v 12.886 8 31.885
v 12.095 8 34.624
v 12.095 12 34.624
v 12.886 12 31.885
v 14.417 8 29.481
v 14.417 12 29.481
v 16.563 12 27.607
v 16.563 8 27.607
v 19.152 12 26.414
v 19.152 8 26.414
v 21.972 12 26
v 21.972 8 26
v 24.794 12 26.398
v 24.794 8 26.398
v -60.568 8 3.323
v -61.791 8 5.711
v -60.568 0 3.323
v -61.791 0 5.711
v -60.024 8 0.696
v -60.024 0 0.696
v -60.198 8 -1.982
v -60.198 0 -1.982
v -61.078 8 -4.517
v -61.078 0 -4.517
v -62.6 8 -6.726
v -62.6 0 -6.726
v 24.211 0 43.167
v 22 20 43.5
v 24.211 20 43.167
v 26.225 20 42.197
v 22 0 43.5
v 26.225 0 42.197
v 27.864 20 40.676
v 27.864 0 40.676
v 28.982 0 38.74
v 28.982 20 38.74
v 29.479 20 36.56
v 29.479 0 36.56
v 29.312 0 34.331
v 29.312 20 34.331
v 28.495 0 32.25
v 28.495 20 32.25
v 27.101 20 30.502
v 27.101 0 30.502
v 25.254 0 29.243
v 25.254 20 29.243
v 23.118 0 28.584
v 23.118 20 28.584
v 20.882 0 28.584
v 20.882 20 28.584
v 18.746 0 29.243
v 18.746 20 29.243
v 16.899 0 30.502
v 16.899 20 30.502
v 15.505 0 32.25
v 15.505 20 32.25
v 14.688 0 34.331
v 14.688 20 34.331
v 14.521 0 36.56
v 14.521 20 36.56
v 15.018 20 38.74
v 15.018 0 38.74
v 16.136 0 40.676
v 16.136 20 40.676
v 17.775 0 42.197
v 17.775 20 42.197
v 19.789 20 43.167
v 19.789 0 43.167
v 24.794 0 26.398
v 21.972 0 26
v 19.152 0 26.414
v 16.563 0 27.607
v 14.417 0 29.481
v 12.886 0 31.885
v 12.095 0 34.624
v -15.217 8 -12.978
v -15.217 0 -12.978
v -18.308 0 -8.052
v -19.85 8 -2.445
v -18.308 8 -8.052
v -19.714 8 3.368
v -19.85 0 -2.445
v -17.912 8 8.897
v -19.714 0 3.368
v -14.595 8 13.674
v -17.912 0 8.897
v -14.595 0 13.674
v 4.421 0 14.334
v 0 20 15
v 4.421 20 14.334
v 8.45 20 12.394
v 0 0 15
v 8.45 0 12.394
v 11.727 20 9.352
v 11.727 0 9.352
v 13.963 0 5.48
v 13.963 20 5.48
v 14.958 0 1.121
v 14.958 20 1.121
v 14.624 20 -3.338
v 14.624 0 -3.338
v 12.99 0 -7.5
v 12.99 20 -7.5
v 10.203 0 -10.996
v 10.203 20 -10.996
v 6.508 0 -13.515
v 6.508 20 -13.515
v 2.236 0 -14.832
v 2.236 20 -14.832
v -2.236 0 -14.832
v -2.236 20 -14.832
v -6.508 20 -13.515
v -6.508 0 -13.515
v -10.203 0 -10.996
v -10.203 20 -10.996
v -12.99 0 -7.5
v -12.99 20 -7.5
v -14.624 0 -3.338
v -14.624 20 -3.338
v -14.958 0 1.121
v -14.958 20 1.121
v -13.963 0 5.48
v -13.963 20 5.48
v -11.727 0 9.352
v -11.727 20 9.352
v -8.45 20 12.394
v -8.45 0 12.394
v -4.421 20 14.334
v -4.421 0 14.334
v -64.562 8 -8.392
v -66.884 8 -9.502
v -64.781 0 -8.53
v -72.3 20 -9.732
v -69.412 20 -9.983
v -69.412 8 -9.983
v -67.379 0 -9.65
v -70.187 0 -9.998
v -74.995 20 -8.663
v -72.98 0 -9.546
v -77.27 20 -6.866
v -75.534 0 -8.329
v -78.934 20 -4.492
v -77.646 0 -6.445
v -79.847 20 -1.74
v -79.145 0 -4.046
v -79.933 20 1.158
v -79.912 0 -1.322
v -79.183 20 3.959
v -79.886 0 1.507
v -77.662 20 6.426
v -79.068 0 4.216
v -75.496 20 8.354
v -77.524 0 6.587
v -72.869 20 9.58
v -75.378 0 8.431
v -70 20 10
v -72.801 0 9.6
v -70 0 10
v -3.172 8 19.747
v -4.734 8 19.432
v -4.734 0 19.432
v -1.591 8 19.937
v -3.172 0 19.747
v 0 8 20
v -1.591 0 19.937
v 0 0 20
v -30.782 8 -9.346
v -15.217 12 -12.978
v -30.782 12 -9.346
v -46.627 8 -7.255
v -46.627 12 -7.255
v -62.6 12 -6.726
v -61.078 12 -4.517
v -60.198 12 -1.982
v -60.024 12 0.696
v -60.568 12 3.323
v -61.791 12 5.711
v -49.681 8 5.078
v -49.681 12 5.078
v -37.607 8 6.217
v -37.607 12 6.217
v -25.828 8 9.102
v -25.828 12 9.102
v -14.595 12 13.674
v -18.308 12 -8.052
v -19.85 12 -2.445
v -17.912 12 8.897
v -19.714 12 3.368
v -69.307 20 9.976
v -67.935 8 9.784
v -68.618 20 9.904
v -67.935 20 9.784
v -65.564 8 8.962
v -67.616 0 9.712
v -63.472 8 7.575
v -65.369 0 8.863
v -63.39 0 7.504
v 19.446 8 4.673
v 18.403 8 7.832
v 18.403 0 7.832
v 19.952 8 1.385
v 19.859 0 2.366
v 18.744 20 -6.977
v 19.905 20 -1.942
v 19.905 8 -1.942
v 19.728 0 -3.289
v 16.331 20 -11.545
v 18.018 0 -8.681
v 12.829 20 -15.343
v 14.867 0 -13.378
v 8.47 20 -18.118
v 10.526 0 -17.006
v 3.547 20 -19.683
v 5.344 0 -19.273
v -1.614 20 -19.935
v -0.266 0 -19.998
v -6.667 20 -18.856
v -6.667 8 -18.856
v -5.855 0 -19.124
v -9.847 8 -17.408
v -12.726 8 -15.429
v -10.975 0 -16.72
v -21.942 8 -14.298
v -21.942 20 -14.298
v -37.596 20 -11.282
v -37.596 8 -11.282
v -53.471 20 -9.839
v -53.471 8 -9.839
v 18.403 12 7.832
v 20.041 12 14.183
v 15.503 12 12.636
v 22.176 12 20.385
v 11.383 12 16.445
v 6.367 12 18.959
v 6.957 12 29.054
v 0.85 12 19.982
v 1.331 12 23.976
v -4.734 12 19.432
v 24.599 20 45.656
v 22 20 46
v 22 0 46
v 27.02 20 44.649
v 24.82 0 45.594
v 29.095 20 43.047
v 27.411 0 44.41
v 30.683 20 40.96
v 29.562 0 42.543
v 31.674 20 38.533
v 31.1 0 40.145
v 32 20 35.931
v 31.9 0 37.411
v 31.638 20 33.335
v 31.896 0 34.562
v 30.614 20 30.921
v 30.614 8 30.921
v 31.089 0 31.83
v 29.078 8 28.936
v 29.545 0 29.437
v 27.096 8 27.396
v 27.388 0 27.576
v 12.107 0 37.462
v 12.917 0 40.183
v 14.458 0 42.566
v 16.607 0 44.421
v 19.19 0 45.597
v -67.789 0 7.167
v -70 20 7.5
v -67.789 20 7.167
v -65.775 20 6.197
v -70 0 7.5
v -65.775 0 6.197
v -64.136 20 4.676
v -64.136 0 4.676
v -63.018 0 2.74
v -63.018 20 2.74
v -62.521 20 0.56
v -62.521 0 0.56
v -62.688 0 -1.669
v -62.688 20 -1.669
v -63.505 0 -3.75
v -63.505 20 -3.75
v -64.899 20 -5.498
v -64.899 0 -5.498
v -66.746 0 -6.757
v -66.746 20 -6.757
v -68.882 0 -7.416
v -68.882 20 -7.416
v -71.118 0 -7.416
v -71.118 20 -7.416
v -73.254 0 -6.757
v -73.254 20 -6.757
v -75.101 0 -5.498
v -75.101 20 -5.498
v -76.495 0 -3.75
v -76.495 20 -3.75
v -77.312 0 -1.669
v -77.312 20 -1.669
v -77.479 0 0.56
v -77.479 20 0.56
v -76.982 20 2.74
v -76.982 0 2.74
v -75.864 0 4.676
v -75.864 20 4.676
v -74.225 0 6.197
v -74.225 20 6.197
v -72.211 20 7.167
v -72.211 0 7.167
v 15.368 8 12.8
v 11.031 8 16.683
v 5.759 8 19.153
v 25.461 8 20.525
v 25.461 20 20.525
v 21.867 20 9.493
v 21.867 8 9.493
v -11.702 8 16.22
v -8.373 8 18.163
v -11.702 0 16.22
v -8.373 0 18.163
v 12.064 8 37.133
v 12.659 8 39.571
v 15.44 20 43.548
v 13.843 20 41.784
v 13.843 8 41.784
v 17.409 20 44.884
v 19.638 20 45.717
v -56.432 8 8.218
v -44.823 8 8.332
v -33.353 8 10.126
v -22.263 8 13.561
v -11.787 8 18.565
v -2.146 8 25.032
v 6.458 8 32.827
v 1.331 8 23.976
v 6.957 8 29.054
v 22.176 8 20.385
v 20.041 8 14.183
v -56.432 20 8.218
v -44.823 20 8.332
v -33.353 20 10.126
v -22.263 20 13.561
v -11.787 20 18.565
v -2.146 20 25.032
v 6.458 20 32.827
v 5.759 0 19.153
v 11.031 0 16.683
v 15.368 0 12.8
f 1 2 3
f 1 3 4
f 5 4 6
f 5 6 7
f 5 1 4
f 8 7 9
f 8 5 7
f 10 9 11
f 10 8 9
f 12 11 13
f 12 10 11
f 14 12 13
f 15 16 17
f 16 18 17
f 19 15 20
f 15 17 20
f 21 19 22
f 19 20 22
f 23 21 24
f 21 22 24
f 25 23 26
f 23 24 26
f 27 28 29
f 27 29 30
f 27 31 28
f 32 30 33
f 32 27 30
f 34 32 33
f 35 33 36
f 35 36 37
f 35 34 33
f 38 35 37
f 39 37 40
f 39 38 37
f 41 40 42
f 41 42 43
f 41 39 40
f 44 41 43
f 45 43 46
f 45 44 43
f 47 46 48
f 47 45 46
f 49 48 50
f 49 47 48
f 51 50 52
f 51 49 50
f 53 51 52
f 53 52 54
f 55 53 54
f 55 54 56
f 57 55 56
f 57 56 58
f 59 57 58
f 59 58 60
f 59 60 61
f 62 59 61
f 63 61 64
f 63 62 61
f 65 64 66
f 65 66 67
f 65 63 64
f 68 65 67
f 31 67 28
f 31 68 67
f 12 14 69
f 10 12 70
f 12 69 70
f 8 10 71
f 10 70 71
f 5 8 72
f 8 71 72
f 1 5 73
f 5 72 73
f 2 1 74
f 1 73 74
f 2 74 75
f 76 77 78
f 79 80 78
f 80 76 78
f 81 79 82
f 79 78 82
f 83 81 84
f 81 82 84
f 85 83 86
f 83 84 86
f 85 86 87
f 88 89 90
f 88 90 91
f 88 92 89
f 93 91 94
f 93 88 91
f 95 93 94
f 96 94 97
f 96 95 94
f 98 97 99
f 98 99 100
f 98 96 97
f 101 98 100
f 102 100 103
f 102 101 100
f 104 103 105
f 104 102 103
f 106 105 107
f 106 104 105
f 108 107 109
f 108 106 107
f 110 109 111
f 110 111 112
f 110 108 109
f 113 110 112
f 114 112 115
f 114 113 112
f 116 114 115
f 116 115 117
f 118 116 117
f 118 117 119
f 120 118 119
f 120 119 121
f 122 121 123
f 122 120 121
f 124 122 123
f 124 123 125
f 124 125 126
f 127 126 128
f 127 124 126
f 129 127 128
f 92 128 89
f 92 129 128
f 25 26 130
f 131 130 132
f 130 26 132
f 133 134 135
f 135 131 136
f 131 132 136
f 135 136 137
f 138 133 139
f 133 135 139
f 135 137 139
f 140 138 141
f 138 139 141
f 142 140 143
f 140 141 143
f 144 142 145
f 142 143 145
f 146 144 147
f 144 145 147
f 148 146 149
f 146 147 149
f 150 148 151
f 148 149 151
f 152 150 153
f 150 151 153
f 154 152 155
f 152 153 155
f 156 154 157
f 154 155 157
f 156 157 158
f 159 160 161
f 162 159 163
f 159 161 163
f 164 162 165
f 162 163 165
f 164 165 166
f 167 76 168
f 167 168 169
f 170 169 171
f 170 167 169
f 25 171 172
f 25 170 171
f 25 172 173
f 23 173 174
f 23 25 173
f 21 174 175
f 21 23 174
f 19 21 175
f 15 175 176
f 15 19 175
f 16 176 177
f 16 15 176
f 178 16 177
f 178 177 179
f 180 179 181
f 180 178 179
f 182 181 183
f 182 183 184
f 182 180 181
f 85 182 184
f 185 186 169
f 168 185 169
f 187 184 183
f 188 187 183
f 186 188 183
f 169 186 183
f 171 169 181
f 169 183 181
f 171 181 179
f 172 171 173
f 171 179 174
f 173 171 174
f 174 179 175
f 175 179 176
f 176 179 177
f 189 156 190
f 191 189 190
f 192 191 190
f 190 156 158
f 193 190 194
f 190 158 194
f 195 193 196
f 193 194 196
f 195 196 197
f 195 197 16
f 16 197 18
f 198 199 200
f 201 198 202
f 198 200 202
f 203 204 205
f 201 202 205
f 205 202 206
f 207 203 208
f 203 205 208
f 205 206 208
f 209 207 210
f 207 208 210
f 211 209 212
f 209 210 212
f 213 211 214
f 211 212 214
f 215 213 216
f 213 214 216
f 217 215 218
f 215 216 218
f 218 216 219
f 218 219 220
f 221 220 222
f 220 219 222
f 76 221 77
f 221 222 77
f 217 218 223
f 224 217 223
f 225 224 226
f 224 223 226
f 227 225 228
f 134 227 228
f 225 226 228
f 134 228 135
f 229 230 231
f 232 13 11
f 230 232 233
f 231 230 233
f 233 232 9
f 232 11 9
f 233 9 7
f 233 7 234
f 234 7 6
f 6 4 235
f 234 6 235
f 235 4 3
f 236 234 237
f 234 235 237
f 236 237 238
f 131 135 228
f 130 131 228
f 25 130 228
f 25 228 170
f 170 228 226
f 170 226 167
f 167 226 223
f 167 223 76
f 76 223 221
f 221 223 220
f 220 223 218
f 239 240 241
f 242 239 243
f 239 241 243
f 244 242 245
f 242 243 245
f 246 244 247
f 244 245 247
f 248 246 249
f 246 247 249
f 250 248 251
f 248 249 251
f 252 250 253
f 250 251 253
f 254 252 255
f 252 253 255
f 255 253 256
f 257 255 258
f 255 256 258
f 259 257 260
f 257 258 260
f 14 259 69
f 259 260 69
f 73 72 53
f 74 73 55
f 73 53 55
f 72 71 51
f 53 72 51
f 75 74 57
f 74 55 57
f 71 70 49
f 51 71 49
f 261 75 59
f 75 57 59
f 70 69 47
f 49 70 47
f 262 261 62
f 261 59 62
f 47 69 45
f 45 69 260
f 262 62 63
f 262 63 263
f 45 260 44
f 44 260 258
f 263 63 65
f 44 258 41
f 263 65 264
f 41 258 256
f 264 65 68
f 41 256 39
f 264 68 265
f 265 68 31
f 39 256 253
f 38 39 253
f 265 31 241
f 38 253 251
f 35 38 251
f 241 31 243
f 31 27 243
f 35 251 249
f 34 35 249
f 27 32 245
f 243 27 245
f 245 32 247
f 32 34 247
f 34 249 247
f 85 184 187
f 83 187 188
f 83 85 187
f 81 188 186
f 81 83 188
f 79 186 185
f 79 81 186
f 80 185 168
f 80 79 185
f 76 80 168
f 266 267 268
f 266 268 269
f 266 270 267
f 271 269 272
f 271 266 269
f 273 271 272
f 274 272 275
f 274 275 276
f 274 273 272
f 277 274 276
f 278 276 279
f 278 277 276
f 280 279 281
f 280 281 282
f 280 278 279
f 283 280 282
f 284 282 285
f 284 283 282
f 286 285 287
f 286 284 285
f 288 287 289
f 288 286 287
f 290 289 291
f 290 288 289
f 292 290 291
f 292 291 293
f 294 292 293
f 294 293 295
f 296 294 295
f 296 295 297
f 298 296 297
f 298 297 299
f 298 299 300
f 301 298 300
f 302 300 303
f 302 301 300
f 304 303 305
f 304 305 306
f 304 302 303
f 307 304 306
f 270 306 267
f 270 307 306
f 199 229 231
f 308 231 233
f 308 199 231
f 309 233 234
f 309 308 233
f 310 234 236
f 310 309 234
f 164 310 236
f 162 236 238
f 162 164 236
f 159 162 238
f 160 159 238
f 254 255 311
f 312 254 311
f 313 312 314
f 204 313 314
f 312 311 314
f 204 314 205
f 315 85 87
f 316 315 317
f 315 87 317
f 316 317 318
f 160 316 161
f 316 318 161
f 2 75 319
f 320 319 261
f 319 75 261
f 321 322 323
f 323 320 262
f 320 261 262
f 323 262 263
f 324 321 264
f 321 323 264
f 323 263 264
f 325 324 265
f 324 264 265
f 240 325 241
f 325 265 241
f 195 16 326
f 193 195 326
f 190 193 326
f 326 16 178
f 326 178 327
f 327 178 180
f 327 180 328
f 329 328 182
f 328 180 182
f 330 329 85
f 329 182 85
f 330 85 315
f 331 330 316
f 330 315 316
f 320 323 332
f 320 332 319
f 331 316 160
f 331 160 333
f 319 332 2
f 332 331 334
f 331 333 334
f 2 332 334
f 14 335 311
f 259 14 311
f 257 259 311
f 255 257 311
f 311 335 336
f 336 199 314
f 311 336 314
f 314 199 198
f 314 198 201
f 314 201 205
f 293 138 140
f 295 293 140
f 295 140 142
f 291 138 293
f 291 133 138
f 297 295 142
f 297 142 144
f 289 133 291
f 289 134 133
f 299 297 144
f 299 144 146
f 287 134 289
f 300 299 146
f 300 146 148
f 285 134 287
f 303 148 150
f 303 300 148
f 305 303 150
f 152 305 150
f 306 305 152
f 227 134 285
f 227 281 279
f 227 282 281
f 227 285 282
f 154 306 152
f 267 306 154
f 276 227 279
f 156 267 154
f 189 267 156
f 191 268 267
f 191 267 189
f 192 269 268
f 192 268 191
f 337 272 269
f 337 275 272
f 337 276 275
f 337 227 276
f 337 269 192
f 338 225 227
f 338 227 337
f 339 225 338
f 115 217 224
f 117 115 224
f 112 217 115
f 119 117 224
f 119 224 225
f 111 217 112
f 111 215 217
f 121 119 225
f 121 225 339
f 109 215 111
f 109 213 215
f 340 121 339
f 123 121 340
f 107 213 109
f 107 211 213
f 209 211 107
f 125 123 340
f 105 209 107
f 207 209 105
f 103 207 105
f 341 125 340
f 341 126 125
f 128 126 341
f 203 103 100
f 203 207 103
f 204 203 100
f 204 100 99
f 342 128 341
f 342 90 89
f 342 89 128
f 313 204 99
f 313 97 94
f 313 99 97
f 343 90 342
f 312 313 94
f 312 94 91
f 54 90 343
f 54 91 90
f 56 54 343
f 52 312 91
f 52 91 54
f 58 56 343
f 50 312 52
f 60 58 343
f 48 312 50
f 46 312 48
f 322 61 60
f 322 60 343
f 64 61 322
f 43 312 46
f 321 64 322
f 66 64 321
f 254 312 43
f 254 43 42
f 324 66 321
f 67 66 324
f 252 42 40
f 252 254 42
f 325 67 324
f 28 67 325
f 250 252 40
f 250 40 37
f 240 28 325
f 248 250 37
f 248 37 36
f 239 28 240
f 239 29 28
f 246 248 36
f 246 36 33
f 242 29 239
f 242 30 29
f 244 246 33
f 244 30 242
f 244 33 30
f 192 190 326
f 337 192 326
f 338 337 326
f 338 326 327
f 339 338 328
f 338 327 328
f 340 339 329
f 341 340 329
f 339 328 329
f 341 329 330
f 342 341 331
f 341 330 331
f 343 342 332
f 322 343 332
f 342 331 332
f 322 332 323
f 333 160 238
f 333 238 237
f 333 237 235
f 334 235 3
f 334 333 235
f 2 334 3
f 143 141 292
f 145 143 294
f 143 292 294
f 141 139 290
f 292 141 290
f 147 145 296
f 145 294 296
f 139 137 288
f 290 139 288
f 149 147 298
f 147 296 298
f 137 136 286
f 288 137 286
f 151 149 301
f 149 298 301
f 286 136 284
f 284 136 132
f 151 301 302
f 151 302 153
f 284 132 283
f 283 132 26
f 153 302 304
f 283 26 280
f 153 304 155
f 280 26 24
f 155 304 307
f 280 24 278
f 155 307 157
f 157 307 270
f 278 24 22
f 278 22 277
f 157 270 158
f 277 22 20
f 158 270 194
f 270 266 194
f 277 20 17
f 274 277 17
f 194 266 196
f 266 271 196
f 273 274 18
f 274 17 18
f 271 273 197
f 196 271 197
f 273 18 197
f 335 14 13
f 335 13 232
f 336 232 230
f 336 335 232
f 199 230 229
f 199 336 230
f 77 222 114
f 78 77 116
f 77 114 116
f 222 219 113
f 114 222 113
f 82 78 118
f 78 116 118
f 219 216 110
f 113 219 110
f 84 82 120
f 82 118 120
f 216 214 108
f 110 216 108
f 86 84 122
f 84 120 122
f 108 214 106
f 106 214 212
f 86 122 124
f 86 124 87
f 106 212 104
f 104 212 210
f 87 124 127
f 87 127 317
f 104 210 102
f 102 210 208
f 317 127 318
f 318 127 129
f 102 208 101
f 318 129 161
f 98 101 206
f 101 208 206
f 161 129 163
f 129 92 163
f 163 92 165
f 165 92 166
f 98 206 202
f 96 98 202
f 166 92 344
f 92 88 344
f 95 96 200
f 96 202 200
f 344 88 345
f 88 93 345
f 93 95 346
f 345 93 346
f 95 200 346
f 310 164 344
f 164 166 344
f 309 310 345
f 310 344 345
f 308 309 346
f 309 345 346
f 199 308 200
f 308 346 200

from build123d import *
from build123d.topology import SkipClean

# Parameters (mm, degrees)
SKETCH1_R             = 20
SKETCH1_R_2           = 15
BOSS_EXTRUDE1_DEPTH   = 20
SKETCH1_R_3           = 10
SKETCH1_R_4           = 7.5
BOSS_EXTRUDE1_2_DEPTH = 20
BOSS_EXTRUDE1_3_DEPTH = 20
BOSS_EXTRUDE2_START   = -12
SKETCH3_R             = 7.5
SKETCH3_R_2           = 15
BOSS_EXTRUDE2_DEPTH   = 12
CUT_EXTRUDE3_DEPTH    = 12


with BuildPart() as part:
    # Sketch1 → Boss-Extrude1 (new body)
    with BuildSketch(Plane(origin=(0, 0, 0), x_dir=(1, 0, 0), z_dir=(0, 1, 0))):
        with Locations(Location((0, 0, 0), (0, 0, 270))):
            Circle(SKETCH1_R)
        with Locations(Location((0, 0, 0), (0, 0, 270))):
            Circle(SKETCH1_R_2, mode=Mode.SUBTRACT)
    extrude(amount=BOSS_EXTRUDE1_DEPTH)



with BuildPart() as body_2:
    # Sketch1 → Boss-Extrude1 2 (new body)
    with BuildSketch(Plane(origin=(0, 0, 0), x_dir=(1, 0, 0), z_dir=(0, 1, 0))):
        with Locations(Location((-70, 0, 0), (0, 0, 270))):
            Circle(SKETCH1_R_3)
        with Locations(Location((-70, 0, 0), (0, 0, 270))):
            Circle(SKETCH1_R_4, mode=Mode.SUBTRACT)
    extrude(amount=BOSS_EXTRUDE1_2_DEPTH)


with BuildPart() as body_3:
    # Sketch1 → Boss-Extrude1 3 (new body)
    with BuildSketch(Plane(origin=(0, 0, 0), x_dir=(1, 0, 0), z_dir=(0, 1, 0))):
        with Locations(Location((22, -36, 0), (0, 0, 270))):
            Circle(SKETCH1_R_3)
        with Locations(Location((22, -36, 0), (0, 0, 270))):
            Circle(SKETCH1_R_4, mode=Mode.SUBTRACT)
    extrude(amount=BOSS_EXTRUDE1_3_DEPTH)


with BuildPart() as part_1:
    add(part.part)

    add(body_2.part)  # Boss-Extrude2 merges body 2

    add(body_3.part)  # Boss-Extrude2 merges body 3
    # Sketch3 → Boss-Extrude2 (add)
    with BuildSketch(Plane(origin=(0, 20, 0), x_dir=(1, 0, 0), z_dir=(0, 1, 0)).offset(BOSS_EXTRUDE2_START)):
        with BuildLine():
            ThreePointArc((-69.411764706, 9.98268397), (-79.972209179, -0.745012818), (-67.934982867, -9.784462389))
            ThreePointArc((-67.934982867, -9.784462389), (-22.262897918, -13.560739124), (13.842794911, -41.784462389))
            ThreePointArc((13.842794911, -41.784462389), (27.436542927, -44.393092457), (30.614150003, -30.920982406))
            ThreePointArc((30.614150003, -30.920982406), (23.463789692, -15.074619609), (19.905470006, 1.94223167))
            ThreePointArc((19.905470006, 1.94223167), (10.739501735, 16.871962022), (-6.666666667, 18.856180832))
            ThreePointArc((-6.666666667, 18.856180832), (-37.595518656, 11.282020609), (-69.411764706, 9.98268397))
        make_face()
        with Locations(Location((22, -36, 0), (0, 0, 270))):
            Circle(SKETCH3_R, mode=Mode.SUBTRACT)
        with Locations(Location((0, 0, 0), (0, 0, 270))):
            Circle(SKETCH3_R_2, mode=Mode.SUBTRACT)
        with Locations(Location((-70, 0, 0), (0, 0, 270))):
            Circle(SKETCH3_R, mode=Mode.SUBTRACT)
    extrude(amount=BOSS_EXTRUDE2_DEPTH)

    # Sketch7 → Cut-Extrude3 (cut)
    with SkipClean():  # the faces are left unmerged after this step: merging them gives an invalid solid
        with BuildSketch(Plane.XZ):
            with BuildLine():
                ThreePointArc((-61.791440547, 5.711352878), (-37.607048321, 6.216745586), (-14.595467543, 13.673782476))
                ThreePointArc((-14.595467543, 13.673782476), (-19.994557018, 0.466572242), (-15.217388241, -12.978100598))
                ThreePointArc((-15.217388241, -12.978100598), (-38.678450916, -8.106148696), (-62.600273301, -6.72636936))
                ThreePointArc((-62.600273301, -6.72636936), (-60.021078075, -0.648935452), (-61.791440547, 5.711352878))
            make_face()
            with BuildLine():
                ThreePointArc((24.793712928, 26.398168504), (21.047204692, 17.304888513), (18.402586233, 7.832293401))
                ThreePointArc((18.402586233, 7.832293401), (8.963679846, 17.878826685), (-4.733552286, 19.431764787))
                ThreePointArc((-4.733552286, 19.431764787), (4.201963756, 26.450336843), (12.095188973, 34.623512255))
                ThreePointArc((12.095188973, 34.623512255), (16.563457073, 27.606907543), (24.793712928, 26.398168504))
            make_face()
        extrude(amount=-CUT_EXTRUDE3_DEPTH, mode=Mode.SUBTRACT)


solid = part_1.part
